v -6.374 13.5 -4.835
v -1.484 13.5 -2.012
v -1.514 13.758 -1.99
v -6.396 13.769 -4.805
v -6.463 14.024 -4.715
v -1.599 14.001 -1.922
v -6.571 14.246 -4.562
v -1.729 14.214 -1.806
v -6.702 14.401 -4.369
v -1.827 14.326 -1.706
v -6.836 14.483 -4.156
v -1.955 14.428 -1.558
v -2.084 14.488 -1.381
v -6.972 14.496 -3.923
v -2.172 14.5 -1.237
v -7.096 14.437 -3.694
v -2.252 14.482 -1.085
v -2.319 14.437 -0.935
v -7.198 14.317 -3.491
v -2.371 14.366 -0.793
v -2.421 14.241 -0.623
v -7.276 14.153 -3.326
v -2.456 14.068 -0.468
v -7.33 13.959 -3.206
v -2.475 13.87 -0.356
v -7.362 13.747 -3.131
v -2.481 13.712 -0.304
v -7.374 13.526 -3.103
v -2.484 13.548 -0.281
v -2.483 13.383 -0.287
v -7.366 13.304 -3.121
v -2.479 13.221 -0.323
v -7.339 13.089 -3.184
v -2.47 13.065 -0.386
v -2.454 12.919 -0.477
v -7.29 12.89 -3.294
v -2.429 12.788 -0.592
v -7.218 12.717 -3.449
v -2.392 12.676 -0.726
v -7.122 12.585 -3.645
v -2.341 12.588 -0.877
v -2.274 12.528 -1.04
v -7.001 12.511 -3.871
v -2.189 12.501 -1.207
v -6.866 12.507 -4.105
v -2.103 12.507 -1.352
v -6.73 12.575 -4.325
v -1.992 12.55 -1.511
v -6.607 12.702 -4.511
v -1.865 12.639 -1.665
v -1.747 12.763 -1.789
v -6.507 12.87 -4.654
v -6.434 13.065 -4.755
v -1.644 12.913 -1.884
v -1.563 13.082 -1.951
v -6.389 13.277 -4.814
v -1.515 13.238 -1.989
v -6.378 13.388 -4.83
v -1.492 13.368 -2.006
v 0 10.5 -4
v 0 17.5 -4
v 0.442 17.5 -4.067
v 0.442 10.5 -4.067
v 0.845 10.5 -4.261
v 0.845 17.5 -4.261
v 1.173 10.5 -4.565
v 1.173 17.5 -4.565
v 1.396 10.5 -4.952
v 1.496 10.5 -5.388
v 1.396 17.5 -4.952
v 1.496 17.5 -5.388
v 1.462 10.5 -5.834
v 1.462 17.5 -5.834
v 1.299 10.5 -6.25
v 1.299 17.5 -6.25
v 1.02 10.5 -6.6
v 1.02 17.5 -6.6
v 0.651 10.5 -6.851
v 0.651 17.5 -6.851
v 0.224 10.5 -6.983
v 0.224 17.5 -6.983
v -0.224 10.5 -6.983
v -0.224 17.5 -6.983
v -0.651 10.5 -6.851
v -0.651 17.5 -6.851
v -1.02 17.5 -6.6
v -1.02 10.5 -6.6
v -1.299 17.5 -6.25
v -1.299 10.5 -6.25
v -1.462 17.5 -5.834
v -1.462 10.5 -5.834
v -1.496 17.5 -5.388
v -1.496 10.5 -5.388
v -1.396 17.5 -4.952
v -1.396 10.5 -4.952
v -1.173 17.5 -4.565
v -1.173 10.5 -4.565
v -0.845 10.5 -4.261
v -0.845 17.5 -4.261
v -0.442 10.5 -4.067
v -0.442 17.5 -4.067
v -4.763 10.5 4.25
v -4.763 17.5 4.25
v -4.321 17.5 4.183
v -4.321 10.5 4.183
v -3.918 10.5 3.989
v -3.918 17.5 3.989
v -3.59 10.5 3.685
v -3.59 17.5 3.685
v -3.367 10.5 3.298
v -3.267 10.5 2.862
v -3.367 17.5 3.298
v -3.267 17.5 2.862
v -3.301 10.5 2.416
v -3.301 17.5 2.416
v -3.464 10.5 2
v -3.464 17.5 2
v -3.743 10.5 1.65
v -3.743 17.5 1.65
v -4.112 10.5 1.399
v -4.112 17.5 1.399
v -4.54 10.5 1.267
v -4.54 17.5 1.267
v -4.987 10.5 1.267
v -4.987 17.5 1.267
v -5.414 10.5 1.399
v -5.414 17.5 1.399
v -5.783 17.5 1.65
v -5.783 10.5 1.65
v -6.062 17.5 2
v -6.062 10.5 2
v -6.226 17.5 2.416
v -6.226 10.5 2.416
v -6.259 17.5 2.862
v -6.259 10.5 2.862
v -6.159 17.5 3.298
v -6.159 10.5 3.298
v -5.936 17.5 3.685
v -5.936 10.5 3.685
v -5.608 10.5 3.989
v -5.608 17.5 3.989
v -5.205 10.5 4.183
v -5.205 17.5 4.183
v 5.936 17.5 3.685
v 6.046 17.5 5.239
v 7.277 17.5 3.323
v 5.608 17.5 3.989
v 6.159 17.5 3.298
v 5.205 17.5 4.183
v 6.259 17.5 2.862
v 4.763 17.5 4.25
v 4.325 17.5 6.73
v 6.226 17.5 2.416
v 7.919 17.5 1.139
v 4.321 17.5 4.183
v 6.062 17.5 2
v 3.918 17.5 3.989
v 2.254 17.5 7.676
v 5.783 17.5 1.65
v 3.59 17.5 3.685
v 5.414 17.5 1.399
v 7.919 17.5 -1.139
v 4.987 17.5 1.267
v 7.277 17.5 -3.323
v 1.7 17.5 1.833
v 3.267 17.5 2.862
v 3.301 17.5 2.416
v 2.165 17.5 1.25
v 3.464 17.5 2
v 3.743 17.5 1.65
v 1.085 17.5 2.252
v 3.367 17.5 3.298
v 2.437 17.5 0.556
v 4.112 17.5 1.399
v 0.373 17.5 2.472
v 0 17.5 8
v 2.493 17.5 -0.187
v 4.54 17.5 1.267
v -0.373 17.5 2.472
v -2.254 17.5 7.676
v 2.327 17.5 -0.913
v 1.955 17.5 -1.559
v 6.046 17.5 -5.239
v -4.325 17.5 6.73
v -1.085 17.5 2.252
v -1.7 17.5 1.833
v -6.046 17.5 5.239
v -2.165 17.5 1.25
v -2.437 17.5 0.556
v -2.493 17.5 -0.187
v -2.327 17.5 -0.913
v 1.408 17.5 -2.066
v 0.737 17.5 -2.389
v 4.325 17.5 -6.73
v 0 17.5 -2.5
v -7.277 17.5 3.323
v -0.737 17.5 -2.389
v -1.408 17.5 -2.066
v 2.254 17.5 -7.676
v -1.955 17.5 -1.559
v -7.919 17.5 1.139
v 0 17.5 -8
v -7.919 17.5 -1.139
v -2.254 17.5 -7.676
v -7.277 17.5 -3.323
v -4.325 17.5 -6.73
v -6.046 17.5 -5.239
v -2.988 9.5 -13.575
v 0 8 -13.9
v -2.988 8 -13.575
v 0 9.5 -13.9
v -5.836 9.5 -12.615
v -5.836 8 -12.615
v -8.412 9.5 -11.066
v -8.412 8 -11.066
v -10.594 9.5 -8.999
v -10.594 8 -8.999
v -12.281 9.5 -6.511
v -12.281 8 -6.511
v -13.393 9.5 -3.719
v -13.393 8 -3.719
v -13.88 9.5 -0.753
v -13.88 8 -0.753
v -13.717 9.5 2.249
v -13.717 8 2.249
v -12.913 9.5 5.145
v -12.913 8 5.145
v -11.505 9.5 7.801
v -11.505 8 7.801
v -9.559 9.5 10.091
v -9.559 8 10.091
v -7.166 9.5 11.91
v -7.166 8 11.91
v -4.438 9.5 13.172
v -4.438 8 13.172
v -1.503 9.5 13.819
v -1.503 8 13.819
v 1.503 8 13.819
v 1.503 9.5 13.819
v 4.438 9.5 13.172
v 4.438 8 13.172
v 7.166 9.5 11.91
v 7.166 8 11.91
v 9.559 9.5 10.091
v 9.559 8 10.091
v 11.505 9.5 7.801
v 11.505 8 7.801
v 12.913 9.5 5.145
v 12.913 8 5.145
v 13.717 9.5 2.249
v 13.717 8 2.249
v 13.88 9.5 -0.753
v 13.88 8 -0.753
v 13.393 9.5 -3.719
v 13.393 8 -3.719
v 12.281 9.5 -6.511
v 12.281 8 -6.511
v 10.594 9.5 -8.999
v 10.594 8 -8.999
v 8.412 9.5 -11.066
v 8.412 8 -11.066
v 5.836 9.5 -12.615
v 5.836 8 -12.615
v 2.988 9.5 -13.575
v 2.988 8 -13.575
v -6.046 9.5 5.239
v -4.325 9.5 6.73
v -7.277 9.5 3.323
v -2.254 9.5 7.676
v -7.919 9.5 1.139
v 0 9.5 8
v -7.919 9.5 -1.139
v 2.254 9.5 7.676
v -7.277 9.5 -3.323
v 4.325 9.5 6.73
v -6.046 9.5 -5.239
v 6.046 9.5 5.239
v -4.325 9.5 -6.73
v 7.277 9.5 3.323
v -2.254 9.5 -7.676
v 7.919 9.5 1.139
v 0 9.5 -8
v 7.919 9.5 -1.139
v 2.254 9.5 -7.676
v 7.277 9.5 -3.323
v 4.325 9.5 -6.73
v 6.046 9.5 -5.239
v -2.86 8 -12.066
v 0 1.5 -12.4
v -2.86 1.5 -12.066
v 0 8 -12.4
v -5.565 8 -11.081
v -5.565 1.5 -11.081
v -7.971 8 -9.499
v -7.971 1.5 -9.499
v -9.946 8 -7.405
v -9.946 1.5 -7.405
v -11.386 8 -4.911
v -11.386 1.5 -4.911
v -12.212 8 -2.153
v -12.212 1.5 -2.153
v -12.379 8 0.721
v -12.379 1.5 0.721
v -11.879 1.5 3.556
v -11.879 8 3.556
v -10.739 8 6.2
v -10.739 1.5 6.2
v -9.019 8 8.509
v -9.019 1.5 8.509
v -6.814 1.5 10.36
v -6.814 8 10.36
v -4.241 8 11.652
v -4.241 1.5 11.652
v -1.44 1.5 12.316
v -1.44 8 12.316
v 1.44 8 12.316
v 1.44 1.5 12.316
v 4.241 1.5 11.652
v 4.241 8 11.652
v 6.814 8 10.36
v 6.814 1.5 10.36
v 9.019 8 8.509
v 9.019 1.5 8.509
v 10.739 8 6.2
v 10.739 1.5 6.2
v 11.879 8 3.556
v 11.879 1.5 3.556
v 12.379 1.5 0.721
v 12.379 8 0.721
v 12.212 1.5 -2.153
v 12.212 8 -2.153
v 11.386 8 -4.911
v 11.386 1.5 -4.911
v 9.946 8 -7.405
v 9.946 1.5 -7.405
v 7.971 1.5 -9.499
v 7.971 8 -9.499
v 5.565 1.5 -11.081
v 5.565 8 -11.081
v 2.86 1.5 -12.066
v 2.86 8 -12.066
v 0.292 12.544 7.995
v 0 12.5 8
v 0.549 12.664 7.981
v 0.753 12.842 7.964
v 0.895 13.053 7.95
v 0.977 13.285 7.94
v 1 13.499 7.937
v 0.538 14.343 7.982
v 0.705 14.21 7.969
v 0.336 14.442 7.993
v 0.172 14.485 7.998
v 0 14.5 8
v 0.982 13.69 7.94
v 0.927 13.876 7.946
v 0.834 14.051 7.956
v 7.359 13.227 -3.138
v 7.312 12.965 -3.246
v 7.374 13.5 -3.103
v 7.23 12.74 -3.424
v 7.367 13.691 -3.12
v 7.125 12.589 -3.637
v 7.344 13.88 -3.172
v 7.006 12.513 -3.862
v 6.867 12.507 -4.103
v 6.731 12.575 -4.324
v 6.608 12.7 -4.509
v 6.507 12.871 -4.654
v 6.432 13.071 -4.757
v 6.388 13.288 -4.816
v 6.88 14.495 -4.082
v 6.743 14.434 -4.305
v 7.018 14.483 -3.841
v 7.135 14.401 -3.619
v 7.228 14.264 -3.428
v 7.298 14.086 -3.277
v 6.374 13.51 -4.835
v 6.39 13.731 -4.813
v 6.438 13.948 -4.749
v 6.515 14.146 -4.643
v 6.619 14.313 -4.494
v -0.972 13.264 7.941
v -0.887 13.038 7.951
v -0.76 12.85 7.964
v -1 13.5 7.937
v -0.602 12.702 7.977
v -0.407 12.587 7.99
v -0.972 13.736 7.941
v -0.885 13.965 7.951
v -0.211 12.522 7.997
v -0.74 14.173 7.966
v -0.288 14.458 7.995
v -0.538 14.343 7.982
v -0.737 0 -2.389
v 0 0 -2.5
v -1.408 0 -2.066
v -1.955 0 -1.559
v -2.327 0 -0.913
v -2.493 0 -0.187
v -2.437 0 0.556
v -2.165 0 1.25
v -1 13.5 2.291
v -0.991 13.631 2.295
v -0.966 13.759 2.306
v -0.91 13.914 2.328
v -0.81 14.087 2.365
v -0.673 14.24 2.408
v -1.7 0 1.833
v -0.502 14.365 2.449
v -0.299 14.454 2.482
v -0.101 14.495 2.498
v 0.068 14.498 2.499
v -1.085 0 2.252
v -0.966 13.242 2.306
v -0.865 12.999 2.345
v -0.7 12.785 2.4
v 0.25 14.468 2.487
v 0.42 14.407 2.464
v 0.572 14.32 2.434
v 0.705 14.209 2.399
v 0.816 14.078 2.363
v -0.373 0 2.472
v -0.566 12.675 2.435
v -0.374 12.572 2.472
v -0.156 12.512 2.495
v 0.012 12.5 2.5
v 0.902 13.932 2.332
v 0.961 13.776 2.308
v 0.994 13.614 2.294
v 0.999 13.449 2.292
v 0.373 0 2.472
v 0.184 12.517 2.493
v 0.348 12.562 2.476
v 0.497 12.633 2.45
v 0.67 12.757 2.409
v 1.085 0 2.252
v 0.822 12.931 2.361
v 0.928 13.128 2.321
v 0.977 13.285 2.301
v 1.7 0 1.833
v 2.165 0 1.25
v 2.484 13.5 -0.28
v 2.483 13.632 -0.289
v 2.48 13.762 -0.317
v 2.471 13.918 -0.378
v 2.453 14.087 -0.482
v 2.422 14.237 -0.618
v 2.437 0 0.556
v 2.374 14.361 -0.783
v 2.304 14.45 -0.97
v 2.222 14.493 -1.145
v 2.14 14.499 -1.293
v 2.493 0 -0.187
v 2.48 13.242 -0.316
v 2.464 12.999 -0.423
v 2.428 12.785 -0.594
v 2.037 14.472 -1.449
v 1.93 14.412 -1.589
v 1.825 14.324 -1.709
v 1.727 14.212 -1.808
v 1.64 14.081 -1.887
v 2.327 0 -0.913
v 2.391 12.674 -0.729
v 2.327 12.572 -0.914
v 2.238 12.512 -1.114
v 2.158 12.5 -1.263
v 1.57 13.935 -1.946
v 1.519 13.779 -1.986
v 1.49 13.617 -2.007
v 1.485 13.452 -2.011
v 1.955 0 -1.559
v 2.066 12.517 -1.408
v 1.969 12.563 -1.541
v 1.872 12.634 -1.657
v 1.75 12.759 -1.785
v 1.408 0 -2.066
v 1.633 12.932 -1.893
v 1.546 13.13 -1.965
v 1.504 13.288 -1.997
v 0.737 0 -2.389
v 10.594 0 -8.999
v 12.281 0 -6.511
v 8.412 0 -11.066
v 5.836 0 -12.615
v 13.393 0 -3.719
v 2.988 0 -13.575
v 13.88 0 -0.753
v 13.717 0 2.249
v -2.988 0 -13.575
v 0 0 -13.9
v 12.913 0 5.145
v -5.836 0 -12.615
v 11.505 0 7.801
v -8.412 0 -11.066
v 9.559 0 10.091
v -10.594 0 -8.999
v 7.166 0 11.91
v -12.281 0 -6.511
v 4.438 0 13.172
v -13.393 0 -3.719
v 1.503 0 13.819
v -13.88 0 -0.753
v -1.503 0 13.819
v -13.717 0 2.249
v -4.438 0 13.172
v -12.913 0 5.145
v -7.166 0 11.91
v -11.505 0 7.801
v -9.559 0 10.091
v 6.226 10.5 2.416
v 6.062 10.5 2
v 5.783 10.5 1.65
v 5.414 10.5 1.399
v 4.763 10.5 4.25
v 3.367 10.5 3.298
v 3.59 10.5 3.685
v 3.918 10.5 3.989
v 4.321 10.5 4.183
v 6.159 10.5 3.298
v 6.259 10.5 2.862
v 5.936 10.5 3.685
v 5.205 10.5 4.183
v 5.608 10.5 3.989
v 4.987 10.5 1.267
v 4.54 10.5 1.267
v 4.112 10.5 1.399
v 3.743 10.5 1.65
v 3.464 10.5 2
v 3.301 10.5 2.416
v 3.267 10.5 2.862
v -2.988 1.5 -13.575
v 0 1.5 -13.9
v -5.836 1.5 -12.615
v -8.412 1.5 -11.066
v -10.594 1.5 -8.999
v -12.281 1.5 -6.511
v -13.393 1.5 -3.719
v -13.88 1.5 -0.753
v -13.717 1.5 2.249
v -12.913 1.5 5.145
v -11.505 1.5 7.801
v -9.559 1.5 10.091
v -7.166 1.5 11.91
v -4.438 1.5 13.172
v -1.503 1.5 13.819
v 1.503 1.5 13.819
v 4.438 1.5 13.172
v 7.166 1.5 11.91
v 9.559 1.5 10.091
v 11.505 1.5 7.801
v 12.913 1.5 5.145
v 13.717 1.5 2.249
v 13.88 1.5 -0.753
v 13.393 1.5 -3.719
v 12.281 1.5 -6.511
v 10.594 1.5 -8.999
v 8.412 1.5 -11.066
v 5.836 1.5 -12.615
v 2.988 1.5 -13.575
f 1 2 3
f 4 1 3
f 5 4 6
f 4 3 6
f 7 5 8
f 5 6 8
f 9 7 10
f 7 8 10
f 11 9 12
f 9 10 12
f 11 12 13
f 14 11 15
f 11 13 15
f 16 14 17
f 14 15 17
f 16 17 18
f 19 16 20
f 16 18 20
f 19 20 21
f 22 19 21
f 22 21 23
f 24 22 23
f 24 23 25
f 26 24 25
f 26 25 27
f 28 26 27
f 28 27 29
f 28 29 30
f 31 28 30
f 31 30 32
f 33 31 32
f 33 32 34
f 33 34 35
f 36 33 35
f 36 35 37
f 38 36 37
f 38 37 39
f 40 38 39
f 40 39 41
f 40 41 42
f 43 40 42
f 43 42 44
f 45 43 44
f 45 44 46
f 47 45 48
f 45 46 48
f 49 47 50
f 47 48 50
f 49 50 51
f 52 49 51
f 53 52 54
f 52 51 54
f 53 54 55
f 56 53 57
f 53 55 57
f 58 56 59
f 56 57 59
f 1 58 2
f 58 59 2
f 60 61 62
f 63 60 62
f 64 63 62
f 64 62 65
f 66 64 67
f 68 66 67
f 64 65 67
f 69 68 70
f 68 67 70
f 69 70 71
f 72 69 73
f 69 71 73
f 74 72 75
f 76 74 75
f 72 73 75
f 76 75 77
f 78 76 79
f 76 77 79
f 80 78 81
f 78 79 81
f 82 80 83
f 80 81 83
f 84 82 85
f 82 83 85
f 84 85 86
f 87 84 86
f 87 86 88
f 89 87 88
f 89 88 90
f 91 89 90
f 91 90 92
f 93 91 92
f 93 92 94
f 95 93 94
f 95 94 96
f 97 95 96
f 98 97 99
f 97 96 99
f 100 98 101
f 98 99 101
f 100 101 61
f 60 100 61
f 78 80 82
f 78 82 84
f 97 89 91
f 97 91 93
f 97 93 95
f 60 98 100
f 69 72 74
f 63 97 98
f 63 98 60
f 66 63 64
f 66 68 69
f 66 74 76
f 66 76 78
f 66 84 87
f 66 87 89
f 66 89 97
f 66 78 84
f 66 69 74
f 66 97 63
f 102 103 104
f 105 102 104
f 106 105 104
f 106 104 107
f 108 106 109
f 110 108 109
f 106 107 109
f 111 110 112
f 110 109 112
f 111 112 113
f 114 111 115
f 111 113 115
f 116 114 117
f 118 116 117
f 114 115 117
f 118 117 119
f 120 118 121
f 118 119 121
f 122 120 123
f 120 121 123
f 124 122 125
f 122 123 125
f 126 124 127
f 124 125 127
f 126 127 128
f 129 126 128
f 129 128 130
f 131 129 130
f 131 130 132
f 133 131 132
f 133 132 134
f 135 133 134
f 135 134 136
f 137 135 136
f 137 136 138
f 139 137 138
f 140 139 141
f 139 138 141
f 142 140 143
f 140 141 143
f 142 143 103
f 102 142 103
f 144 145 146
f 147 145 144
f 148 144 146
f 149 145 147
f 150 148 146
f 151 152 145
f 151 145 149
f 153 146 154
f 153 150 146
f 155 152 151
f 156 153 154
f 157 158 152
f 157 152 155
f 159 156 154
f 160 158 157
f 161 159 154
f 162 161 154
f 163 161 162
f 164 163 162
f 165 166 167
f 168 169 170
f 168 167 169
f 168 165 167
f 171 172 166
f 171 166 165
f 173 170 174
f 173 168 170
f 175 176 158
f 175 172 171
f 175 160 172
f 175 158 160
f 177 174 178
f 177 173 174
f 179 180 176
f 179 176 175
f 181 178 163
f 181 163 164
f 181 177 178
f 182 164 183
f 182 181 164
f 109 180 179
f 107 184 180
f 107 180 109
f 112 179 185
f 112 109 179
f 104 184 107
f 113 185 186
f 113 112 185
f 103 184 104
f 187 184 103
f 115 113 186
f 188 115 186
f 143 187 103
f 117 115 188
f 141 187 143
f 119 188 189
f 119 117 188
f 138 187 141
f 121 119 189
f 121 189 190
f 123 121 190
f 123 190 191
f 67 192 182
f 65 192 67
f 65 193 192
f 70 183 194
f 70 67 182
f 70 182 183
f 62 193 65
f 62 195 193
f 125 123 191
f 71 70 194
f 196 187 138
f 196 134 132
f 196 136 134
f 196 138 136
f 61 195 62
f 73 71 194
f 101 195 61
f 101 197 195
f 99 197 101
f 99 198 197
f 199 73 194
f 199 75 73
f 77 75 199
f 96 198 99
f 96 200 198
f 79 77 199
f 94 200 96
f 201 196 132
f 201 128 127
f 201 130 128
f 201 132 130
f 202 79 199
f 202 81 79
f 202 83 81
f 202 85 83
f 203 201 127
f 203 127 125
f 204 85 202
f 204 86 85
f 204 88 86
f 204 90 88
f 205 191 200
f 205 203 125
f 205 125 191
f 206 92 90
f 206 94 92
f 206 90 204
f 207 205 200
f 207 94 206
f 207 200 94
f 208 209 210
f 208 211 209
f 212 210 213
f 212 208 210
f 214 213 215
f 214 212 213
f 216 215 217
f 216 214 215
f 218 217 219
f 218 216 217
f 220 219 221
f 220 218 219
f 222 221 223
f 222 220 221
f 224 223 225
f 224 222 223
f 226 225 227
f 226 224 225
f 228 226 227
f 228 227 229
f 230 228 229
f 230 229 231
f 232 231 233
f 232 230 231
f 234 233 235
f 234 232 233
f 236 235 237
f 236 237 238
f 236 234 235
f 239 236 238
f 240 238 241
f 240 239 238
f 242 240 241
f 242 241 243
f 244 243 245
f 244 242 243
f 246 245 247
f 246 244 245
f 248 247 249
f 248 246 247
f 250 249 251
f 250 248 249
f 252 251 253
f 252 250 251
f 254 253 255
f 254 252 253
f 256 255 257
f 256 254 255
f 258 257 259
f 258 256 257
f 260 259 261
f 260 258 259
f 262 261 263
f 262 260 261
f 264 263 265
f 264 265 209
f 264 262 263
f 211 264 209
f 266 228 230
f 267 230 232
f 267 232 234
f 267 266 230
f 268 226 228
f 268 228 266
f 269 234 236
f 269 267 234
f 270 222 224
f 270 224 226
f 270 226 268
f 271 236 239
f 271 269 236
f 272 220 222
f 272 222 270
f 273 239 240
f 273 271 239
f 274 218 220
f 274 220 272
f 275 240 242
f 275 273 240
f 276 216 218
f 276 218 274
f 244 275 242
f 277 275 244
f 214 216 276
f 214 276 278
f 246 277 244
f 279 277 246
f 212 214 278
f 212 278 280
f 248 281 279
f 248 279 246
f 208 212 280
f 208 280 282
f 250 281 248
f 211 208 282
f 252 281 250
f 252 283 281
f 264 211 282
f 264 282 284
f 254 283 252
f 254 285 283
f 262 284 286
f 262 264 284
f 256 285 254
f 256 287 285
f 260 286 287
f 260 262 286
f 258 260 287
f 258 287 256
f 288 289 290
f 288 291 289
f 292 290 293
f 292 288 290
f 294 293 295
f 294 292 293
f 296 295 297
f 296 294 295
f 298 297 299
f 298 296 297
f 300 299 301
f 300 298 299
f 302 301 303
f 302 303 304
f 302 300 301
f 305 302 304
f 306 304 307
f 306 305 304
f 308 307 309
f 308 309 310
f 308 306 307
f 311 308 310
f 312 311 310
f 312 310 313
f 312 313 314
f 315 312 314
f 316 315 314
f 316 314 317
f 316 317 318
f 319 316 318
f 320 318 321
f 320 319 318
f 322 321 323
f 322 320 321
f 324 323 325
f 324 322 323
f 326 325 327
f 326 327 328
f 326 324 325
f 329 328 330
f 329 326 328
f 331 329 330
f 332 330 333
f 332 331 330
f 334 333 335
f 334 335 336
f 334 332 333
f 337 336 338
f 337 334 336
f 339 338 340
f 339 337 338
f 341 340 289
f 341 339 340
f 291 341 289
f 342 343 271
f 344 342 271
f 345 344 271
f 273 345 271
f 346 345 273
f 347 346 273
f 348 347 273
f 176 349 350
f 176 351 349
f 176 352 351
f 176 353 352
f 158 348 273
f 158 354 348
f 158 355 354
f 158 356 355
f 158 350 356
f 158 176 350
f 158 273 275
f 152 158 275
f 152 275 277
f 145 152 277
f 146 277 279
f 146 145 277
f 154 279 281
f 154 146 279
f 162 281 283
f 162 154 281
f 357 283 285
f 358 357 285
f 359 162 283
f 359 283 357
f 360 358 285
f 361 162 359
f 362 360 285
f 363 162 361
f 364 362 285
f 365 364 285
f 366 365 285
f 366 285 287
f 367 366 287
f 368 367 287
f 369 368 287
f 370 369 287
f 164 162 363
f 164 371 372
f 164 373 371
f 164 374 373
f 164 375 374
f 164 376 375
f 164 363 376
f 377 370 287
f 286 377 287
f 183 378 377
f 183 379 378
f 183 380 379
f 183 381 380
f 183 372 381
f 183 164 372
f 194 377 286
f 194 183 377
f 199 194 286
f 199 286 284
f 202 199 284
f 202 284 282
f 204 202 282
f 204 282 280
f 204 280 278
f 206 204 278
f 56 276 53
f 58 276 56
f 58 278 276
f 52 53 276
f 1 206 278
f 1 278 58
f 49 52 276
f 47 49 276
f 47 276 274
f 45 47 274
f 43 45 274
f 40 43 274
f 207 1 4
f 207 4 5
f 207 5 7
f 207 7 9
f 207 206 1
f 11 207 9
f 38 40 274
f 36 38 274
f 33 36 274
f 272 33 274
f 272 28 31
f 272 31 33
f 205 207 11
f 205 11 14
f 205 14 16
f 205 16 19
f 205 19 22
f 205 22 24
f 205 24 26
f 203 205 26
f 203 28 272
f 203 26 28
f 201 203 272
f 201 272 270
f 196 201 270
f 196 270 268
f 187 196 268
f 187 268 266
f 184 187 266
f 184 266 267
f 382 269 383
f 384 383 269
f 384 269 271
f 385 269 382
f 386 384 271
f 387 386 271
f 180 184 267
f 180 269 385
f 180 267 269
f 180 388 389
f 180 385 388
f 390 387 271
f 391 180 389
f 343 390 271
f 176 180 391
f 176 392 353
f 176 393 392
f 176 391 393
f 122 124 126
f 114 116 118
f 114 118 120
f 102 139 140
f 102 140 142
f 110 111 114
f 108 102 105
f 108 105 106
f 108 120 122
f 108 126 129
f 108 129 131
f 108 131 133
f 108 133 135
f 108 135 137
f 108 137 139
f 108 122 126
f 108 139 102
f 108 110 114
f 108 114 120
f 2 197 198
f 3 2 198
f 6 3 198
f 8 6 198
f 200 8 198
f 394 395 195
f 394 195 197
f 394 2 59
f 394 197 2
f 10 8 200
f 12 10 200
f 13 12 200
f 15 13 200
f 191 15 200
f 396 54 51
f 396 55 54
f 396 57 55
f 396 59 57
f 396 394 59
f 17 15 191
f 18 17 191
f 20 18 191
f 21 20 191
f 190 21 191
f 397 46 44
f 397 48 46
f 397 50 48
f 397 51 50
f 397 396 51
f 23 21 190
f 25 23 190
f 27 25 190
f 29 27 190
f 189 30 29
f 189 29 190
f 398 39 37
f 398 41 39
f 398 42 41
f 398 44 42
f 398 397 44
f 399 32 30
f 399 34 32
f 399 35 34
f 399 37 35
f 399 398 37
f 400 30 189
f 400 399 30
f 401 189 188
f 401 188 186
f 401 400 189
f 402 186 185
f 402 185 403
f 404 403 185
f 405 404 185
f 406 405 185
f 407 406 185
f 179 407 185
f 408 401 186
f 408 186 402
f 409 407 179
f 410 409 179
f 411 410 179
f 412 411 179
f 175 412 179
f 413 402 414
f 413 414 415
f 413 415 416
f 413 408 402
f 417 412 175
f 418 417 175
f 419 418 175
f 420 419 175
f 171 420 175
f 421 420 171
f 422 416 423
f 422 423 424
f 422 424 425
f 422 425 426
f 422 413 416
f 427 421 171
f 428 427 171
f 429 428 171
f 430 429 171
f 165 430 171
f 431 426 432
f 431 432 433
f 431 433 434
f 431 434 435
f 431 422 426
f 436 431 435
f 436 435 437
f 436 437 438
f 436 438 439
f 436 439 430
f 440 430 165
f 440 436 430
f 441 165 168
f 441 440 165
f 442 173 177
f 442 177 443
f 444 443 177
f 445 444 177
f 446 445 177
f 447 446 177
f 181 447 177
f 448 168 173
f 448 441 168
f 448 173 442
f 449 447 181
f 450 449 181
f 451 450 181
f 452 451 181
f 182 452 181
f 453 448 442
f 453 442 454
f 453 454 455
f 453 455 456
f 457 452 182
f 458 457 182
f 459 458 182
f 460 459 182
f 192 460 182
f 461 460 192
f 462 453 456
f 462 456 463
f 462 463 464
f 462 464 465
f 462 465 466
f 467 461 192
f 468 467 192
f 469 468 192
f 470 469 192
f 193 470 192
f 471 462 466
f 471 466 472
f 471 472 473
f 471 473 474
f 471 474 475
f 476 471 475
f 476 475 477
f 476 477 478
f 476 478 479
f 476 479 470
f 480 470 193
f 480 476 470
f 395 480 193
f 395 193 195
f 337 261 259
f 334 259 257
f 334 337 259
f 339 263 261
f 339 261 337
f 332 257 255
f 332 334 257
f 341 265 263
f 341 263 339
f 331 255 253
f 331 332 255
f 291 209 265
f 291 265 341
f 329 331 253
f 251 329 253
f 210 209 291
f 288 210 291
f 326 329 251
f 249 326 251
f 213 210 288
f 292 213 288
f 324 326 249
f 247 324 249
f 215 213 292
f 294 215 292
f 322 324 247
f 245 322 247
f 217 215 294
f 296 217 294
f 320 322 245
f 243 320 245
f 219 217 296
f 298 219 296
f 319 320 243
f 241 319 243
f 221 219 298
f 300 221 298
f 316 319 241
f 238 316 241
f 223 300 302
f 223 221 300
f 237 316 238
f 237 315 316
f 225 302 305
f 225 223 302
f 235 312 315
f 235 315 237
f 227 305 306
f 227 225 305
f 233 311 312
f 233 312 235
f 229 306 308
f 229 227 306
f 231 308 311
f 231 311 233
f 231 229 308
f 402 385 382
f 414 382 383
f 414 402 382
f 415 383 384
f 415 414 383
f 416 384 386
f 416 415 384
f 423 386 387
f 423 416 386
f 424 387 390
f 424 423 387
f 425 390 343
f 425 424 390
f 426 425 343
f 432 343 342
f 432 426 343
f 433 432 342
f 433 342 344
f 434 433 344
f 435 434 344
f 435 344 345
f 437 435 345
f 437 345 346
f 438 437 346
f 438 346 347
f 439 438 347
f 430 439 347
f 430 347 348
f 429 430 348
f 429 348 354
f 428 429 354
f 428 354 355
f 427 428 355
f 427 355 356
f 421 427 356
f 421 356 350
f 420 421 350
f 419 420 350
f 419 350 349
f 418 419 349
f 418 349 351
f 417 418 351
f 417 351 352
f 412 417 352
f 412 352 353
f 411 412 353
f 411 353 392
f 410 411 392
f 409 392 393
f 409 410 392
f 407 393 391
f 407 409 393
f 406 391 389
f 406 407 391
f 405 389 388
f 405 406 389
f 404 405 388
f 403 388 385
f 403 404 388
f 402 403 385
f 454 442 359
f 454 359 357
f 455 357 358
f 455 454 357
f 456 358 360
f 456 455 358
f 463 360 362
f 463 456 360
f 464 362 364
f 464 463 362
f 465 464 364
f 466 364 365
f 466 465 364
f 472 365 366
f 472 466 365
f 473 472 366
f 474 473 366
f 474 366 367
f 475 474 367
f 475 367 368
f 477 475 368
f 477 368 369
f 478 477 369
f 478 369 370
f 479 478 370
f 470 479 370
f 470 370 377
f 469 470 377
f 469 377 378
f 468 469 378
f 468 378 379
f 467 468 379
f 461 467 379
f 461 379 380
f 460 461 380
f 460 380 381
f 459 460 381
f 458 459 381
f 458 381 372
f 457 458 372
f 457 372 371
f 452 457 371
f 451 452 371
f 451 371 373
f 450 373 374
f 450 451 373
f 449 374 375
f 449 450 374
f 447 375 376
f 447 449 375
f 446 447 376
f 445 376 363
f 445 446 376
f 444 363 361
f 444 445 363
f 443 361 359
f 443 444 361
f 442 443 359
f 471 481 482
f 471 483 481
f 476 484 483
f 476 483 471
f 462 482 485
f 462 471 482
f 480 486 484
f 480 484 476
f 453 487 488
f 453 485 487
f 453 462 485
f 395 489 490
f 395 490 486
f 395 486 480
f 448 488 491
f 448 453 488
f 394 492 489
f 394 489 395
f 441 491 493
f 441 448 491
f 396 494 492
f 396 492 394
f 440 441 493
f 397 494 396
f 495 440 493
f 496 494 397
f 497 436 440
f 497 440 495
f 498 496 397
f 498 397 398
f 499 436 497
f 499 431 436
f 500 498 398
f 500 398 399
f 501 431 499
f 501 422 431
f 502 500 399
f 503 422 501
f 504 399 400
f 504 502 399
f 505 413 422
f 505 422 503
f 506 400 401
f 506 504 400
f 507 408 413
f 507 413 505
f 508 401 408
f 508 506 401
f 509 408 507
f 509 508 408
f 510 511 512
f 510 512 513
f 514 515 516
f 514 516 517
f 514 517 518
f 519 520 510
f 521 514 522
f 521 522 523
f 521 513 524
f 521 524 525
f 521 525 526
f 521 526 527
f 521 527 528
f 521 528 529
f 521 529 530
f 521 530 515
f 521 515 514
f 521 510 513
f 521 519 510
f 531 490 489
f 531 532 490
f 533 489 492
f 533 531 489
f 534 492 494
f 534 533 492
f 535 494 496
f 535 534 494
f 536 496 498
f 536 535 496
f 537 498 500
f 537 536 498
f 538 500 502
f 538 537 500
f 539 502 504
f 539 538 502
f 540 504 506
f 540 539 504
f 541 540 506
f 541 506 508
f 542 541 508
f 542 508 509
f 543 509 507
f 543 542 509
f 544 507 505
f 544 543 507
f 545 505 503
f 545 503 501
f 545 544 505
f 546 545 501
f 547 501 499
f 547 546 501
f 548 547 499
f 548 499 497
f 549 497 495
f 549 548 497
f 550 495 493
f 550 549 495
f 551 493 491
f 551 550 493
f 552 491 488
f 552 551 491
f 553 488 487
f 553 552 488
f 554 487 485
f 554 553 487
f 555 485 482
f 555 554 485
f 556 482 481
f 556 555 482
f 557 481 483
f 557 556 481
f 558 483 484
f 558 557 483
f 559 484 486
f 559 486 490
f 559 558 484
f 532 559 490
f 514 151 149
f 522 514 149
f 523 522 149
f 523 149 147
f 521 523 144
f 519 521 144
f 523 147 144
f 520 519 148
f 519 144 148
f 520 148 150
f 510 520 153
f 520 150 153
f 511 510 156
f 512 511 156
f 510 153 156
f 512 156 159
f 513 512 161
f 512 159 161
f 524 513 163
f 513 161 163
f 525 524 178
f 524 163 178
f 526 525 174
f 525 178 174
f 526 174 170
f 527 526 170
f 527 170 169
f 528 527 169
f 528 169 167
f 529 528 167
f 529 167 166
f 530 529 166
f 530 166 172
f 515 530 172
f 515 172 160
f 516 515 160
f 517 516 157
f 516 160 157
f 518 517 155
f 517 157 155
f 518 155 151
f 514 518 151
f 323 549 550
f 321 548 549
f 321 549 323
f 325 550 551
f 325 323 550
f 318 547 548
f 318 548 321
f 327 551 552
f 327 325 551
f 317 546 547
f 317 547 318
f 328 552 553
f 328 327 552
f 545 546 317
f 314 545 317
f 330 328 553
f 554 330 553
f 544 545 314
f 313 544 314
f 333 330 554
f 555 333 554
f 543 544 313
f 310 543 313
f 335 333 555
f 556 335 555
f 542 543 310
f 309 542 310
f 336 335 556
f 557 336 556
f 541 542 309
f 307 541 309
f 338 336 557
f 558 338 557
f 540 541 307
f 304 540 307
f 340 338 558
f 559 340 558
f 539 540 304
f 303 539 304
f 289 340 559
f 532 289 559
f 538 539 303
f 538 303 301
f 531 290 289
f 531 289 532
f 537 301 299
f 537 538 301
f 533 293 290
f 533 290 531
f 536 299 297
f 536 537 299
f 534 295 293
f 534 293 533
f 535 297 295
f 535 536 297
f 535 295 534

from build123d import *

# Parameters (mm, degrees)
ESQUISSE2_R             = 8.85
ESQUISSE2_R_2           = 8
ENL_V_MAT_EXTRU_1_DEPTH = 8
ESQUISSE3_R             = 1.5
ENL_V_MAT_EXTRU_2_DEPTH = 7
ESQUISSE4_R             = 1
ENL_V_MAT_EXTRU_3_DEPTH = 10
ESQUISSE6_R             = 1
ENL_V_MAT_EXTRU_4_DEPTH = 10
ESQUISSE7_R             = 1
ENL_V_MAT_EXTRU_5_DEPTH = 10


with BuildPart() as part:
    # Esquisse1 → Révolution1 (revolve)
    with BuildSketch(Plane.XY, mode=Mode.PRIVATE) as r_volution1_sk:
        Polygon((2.5, 0), (13.9, 0), (13.9, 1.5), (12.4, 1.5), (12.4, 8), (13.9, 8), (13.9, 9.5), (8.85, 9.5), (8.85, 17.5), (2.5, 17.5), align=None)
    revolve(r_volution1_sk.sketch.rotate(Axis((0, 0, 0), (0, 1, 0)), 90), axis=Axis((0, 0, 0), (0, 1, 0)))

    # Esquisse2 → Enlèv. mat.-Extru.1 (cut)
    with BuildSketch(Plane(origin=(0, 17.5, 0), x_dir=(1, 0, 0), z_dir=(0, 1, 0))):
        Circle(ESQUISSE2_R)
        with Locations(Location((0, 0, 0), (0, 0, 270))):
            Circle(ESQUISSE2_R_2, mode=Mode.SUBTRACT)
    extrude(amount=-ENL_V_MAT_EXTRU_1_DEPTH, mode=Mode.SUBTRACT)

    # Esquisse3 → Enlèv. mat.-Extru.2 (cut)
    with BuildSketch(Plane(origin=(0, 17.5, 0), x_dir=(1, 0, 0), z_dir=(0, 1, 0))):
        with Locations(Location((0, 5.5, 0), (0, 0, 270))):
            Circle(ESQUISSE3_R)
        with Locations(Location((4.763139721, -2.75, 0), (0, 0, 270))):
            Circle(ESQUISSE3_R)
        with Locations(Location((-4.763139721, -2.75, 0), (0, 0, 270))):
            Circle(ESQUISSE3_R)
    extrude(amount=-ENL_V_MAT_EXTRU_2_DEPTH, mode=Mode.SUBTRACT)

    # Esquisse4 → Enlèv. mat.-Extru.3 (cut)
    with BuildSketch(Plane.XY):
        with Locations(Location((0, 13.5, 0), (0, 0, 180))):
            Circle(ESQUISSE4_R)
    extrude(amount=ENL_V_MAT_EXTRU_3_DEPTH, mode=Mode.SUBTRACT)

    # Esquisse6 → Enlèv. mat.-Extru.4 (cut)
    with BuildSketch(Plane(origin=(0, 0, 0), x_dir=(0, 1, 0), z_dir=(0.8660254037844398, 0, 0.499999999999998))):
        with Locations(Location((13.499909745, 0, 0), (0, 0, 270))):
            Circle(ESQUISSE6_R)
    extrude(amount=-ENL_V_MAT_EXTRU_4_DEPTH, mode=Mode.SUBTRACT)

    # Esquisse7 → Enlèv. mat.-Extru.5 (cut)
    with BuildSketch(Plane(origin=(0, 0, 0), x_dir=(0, 1, 0), z_dir=(0.8660254037844364, 0, -0.500000000000004))):
        with Locations(Location((13.5, 0, 0), (0, 0, 90))):
            Circle(ESQUISSE7_R)
    extrude(amount=ENL_V_MAT_EXTRU_5_DEPTH, mode=Mode.SUBTRACT)


solid = part.part
